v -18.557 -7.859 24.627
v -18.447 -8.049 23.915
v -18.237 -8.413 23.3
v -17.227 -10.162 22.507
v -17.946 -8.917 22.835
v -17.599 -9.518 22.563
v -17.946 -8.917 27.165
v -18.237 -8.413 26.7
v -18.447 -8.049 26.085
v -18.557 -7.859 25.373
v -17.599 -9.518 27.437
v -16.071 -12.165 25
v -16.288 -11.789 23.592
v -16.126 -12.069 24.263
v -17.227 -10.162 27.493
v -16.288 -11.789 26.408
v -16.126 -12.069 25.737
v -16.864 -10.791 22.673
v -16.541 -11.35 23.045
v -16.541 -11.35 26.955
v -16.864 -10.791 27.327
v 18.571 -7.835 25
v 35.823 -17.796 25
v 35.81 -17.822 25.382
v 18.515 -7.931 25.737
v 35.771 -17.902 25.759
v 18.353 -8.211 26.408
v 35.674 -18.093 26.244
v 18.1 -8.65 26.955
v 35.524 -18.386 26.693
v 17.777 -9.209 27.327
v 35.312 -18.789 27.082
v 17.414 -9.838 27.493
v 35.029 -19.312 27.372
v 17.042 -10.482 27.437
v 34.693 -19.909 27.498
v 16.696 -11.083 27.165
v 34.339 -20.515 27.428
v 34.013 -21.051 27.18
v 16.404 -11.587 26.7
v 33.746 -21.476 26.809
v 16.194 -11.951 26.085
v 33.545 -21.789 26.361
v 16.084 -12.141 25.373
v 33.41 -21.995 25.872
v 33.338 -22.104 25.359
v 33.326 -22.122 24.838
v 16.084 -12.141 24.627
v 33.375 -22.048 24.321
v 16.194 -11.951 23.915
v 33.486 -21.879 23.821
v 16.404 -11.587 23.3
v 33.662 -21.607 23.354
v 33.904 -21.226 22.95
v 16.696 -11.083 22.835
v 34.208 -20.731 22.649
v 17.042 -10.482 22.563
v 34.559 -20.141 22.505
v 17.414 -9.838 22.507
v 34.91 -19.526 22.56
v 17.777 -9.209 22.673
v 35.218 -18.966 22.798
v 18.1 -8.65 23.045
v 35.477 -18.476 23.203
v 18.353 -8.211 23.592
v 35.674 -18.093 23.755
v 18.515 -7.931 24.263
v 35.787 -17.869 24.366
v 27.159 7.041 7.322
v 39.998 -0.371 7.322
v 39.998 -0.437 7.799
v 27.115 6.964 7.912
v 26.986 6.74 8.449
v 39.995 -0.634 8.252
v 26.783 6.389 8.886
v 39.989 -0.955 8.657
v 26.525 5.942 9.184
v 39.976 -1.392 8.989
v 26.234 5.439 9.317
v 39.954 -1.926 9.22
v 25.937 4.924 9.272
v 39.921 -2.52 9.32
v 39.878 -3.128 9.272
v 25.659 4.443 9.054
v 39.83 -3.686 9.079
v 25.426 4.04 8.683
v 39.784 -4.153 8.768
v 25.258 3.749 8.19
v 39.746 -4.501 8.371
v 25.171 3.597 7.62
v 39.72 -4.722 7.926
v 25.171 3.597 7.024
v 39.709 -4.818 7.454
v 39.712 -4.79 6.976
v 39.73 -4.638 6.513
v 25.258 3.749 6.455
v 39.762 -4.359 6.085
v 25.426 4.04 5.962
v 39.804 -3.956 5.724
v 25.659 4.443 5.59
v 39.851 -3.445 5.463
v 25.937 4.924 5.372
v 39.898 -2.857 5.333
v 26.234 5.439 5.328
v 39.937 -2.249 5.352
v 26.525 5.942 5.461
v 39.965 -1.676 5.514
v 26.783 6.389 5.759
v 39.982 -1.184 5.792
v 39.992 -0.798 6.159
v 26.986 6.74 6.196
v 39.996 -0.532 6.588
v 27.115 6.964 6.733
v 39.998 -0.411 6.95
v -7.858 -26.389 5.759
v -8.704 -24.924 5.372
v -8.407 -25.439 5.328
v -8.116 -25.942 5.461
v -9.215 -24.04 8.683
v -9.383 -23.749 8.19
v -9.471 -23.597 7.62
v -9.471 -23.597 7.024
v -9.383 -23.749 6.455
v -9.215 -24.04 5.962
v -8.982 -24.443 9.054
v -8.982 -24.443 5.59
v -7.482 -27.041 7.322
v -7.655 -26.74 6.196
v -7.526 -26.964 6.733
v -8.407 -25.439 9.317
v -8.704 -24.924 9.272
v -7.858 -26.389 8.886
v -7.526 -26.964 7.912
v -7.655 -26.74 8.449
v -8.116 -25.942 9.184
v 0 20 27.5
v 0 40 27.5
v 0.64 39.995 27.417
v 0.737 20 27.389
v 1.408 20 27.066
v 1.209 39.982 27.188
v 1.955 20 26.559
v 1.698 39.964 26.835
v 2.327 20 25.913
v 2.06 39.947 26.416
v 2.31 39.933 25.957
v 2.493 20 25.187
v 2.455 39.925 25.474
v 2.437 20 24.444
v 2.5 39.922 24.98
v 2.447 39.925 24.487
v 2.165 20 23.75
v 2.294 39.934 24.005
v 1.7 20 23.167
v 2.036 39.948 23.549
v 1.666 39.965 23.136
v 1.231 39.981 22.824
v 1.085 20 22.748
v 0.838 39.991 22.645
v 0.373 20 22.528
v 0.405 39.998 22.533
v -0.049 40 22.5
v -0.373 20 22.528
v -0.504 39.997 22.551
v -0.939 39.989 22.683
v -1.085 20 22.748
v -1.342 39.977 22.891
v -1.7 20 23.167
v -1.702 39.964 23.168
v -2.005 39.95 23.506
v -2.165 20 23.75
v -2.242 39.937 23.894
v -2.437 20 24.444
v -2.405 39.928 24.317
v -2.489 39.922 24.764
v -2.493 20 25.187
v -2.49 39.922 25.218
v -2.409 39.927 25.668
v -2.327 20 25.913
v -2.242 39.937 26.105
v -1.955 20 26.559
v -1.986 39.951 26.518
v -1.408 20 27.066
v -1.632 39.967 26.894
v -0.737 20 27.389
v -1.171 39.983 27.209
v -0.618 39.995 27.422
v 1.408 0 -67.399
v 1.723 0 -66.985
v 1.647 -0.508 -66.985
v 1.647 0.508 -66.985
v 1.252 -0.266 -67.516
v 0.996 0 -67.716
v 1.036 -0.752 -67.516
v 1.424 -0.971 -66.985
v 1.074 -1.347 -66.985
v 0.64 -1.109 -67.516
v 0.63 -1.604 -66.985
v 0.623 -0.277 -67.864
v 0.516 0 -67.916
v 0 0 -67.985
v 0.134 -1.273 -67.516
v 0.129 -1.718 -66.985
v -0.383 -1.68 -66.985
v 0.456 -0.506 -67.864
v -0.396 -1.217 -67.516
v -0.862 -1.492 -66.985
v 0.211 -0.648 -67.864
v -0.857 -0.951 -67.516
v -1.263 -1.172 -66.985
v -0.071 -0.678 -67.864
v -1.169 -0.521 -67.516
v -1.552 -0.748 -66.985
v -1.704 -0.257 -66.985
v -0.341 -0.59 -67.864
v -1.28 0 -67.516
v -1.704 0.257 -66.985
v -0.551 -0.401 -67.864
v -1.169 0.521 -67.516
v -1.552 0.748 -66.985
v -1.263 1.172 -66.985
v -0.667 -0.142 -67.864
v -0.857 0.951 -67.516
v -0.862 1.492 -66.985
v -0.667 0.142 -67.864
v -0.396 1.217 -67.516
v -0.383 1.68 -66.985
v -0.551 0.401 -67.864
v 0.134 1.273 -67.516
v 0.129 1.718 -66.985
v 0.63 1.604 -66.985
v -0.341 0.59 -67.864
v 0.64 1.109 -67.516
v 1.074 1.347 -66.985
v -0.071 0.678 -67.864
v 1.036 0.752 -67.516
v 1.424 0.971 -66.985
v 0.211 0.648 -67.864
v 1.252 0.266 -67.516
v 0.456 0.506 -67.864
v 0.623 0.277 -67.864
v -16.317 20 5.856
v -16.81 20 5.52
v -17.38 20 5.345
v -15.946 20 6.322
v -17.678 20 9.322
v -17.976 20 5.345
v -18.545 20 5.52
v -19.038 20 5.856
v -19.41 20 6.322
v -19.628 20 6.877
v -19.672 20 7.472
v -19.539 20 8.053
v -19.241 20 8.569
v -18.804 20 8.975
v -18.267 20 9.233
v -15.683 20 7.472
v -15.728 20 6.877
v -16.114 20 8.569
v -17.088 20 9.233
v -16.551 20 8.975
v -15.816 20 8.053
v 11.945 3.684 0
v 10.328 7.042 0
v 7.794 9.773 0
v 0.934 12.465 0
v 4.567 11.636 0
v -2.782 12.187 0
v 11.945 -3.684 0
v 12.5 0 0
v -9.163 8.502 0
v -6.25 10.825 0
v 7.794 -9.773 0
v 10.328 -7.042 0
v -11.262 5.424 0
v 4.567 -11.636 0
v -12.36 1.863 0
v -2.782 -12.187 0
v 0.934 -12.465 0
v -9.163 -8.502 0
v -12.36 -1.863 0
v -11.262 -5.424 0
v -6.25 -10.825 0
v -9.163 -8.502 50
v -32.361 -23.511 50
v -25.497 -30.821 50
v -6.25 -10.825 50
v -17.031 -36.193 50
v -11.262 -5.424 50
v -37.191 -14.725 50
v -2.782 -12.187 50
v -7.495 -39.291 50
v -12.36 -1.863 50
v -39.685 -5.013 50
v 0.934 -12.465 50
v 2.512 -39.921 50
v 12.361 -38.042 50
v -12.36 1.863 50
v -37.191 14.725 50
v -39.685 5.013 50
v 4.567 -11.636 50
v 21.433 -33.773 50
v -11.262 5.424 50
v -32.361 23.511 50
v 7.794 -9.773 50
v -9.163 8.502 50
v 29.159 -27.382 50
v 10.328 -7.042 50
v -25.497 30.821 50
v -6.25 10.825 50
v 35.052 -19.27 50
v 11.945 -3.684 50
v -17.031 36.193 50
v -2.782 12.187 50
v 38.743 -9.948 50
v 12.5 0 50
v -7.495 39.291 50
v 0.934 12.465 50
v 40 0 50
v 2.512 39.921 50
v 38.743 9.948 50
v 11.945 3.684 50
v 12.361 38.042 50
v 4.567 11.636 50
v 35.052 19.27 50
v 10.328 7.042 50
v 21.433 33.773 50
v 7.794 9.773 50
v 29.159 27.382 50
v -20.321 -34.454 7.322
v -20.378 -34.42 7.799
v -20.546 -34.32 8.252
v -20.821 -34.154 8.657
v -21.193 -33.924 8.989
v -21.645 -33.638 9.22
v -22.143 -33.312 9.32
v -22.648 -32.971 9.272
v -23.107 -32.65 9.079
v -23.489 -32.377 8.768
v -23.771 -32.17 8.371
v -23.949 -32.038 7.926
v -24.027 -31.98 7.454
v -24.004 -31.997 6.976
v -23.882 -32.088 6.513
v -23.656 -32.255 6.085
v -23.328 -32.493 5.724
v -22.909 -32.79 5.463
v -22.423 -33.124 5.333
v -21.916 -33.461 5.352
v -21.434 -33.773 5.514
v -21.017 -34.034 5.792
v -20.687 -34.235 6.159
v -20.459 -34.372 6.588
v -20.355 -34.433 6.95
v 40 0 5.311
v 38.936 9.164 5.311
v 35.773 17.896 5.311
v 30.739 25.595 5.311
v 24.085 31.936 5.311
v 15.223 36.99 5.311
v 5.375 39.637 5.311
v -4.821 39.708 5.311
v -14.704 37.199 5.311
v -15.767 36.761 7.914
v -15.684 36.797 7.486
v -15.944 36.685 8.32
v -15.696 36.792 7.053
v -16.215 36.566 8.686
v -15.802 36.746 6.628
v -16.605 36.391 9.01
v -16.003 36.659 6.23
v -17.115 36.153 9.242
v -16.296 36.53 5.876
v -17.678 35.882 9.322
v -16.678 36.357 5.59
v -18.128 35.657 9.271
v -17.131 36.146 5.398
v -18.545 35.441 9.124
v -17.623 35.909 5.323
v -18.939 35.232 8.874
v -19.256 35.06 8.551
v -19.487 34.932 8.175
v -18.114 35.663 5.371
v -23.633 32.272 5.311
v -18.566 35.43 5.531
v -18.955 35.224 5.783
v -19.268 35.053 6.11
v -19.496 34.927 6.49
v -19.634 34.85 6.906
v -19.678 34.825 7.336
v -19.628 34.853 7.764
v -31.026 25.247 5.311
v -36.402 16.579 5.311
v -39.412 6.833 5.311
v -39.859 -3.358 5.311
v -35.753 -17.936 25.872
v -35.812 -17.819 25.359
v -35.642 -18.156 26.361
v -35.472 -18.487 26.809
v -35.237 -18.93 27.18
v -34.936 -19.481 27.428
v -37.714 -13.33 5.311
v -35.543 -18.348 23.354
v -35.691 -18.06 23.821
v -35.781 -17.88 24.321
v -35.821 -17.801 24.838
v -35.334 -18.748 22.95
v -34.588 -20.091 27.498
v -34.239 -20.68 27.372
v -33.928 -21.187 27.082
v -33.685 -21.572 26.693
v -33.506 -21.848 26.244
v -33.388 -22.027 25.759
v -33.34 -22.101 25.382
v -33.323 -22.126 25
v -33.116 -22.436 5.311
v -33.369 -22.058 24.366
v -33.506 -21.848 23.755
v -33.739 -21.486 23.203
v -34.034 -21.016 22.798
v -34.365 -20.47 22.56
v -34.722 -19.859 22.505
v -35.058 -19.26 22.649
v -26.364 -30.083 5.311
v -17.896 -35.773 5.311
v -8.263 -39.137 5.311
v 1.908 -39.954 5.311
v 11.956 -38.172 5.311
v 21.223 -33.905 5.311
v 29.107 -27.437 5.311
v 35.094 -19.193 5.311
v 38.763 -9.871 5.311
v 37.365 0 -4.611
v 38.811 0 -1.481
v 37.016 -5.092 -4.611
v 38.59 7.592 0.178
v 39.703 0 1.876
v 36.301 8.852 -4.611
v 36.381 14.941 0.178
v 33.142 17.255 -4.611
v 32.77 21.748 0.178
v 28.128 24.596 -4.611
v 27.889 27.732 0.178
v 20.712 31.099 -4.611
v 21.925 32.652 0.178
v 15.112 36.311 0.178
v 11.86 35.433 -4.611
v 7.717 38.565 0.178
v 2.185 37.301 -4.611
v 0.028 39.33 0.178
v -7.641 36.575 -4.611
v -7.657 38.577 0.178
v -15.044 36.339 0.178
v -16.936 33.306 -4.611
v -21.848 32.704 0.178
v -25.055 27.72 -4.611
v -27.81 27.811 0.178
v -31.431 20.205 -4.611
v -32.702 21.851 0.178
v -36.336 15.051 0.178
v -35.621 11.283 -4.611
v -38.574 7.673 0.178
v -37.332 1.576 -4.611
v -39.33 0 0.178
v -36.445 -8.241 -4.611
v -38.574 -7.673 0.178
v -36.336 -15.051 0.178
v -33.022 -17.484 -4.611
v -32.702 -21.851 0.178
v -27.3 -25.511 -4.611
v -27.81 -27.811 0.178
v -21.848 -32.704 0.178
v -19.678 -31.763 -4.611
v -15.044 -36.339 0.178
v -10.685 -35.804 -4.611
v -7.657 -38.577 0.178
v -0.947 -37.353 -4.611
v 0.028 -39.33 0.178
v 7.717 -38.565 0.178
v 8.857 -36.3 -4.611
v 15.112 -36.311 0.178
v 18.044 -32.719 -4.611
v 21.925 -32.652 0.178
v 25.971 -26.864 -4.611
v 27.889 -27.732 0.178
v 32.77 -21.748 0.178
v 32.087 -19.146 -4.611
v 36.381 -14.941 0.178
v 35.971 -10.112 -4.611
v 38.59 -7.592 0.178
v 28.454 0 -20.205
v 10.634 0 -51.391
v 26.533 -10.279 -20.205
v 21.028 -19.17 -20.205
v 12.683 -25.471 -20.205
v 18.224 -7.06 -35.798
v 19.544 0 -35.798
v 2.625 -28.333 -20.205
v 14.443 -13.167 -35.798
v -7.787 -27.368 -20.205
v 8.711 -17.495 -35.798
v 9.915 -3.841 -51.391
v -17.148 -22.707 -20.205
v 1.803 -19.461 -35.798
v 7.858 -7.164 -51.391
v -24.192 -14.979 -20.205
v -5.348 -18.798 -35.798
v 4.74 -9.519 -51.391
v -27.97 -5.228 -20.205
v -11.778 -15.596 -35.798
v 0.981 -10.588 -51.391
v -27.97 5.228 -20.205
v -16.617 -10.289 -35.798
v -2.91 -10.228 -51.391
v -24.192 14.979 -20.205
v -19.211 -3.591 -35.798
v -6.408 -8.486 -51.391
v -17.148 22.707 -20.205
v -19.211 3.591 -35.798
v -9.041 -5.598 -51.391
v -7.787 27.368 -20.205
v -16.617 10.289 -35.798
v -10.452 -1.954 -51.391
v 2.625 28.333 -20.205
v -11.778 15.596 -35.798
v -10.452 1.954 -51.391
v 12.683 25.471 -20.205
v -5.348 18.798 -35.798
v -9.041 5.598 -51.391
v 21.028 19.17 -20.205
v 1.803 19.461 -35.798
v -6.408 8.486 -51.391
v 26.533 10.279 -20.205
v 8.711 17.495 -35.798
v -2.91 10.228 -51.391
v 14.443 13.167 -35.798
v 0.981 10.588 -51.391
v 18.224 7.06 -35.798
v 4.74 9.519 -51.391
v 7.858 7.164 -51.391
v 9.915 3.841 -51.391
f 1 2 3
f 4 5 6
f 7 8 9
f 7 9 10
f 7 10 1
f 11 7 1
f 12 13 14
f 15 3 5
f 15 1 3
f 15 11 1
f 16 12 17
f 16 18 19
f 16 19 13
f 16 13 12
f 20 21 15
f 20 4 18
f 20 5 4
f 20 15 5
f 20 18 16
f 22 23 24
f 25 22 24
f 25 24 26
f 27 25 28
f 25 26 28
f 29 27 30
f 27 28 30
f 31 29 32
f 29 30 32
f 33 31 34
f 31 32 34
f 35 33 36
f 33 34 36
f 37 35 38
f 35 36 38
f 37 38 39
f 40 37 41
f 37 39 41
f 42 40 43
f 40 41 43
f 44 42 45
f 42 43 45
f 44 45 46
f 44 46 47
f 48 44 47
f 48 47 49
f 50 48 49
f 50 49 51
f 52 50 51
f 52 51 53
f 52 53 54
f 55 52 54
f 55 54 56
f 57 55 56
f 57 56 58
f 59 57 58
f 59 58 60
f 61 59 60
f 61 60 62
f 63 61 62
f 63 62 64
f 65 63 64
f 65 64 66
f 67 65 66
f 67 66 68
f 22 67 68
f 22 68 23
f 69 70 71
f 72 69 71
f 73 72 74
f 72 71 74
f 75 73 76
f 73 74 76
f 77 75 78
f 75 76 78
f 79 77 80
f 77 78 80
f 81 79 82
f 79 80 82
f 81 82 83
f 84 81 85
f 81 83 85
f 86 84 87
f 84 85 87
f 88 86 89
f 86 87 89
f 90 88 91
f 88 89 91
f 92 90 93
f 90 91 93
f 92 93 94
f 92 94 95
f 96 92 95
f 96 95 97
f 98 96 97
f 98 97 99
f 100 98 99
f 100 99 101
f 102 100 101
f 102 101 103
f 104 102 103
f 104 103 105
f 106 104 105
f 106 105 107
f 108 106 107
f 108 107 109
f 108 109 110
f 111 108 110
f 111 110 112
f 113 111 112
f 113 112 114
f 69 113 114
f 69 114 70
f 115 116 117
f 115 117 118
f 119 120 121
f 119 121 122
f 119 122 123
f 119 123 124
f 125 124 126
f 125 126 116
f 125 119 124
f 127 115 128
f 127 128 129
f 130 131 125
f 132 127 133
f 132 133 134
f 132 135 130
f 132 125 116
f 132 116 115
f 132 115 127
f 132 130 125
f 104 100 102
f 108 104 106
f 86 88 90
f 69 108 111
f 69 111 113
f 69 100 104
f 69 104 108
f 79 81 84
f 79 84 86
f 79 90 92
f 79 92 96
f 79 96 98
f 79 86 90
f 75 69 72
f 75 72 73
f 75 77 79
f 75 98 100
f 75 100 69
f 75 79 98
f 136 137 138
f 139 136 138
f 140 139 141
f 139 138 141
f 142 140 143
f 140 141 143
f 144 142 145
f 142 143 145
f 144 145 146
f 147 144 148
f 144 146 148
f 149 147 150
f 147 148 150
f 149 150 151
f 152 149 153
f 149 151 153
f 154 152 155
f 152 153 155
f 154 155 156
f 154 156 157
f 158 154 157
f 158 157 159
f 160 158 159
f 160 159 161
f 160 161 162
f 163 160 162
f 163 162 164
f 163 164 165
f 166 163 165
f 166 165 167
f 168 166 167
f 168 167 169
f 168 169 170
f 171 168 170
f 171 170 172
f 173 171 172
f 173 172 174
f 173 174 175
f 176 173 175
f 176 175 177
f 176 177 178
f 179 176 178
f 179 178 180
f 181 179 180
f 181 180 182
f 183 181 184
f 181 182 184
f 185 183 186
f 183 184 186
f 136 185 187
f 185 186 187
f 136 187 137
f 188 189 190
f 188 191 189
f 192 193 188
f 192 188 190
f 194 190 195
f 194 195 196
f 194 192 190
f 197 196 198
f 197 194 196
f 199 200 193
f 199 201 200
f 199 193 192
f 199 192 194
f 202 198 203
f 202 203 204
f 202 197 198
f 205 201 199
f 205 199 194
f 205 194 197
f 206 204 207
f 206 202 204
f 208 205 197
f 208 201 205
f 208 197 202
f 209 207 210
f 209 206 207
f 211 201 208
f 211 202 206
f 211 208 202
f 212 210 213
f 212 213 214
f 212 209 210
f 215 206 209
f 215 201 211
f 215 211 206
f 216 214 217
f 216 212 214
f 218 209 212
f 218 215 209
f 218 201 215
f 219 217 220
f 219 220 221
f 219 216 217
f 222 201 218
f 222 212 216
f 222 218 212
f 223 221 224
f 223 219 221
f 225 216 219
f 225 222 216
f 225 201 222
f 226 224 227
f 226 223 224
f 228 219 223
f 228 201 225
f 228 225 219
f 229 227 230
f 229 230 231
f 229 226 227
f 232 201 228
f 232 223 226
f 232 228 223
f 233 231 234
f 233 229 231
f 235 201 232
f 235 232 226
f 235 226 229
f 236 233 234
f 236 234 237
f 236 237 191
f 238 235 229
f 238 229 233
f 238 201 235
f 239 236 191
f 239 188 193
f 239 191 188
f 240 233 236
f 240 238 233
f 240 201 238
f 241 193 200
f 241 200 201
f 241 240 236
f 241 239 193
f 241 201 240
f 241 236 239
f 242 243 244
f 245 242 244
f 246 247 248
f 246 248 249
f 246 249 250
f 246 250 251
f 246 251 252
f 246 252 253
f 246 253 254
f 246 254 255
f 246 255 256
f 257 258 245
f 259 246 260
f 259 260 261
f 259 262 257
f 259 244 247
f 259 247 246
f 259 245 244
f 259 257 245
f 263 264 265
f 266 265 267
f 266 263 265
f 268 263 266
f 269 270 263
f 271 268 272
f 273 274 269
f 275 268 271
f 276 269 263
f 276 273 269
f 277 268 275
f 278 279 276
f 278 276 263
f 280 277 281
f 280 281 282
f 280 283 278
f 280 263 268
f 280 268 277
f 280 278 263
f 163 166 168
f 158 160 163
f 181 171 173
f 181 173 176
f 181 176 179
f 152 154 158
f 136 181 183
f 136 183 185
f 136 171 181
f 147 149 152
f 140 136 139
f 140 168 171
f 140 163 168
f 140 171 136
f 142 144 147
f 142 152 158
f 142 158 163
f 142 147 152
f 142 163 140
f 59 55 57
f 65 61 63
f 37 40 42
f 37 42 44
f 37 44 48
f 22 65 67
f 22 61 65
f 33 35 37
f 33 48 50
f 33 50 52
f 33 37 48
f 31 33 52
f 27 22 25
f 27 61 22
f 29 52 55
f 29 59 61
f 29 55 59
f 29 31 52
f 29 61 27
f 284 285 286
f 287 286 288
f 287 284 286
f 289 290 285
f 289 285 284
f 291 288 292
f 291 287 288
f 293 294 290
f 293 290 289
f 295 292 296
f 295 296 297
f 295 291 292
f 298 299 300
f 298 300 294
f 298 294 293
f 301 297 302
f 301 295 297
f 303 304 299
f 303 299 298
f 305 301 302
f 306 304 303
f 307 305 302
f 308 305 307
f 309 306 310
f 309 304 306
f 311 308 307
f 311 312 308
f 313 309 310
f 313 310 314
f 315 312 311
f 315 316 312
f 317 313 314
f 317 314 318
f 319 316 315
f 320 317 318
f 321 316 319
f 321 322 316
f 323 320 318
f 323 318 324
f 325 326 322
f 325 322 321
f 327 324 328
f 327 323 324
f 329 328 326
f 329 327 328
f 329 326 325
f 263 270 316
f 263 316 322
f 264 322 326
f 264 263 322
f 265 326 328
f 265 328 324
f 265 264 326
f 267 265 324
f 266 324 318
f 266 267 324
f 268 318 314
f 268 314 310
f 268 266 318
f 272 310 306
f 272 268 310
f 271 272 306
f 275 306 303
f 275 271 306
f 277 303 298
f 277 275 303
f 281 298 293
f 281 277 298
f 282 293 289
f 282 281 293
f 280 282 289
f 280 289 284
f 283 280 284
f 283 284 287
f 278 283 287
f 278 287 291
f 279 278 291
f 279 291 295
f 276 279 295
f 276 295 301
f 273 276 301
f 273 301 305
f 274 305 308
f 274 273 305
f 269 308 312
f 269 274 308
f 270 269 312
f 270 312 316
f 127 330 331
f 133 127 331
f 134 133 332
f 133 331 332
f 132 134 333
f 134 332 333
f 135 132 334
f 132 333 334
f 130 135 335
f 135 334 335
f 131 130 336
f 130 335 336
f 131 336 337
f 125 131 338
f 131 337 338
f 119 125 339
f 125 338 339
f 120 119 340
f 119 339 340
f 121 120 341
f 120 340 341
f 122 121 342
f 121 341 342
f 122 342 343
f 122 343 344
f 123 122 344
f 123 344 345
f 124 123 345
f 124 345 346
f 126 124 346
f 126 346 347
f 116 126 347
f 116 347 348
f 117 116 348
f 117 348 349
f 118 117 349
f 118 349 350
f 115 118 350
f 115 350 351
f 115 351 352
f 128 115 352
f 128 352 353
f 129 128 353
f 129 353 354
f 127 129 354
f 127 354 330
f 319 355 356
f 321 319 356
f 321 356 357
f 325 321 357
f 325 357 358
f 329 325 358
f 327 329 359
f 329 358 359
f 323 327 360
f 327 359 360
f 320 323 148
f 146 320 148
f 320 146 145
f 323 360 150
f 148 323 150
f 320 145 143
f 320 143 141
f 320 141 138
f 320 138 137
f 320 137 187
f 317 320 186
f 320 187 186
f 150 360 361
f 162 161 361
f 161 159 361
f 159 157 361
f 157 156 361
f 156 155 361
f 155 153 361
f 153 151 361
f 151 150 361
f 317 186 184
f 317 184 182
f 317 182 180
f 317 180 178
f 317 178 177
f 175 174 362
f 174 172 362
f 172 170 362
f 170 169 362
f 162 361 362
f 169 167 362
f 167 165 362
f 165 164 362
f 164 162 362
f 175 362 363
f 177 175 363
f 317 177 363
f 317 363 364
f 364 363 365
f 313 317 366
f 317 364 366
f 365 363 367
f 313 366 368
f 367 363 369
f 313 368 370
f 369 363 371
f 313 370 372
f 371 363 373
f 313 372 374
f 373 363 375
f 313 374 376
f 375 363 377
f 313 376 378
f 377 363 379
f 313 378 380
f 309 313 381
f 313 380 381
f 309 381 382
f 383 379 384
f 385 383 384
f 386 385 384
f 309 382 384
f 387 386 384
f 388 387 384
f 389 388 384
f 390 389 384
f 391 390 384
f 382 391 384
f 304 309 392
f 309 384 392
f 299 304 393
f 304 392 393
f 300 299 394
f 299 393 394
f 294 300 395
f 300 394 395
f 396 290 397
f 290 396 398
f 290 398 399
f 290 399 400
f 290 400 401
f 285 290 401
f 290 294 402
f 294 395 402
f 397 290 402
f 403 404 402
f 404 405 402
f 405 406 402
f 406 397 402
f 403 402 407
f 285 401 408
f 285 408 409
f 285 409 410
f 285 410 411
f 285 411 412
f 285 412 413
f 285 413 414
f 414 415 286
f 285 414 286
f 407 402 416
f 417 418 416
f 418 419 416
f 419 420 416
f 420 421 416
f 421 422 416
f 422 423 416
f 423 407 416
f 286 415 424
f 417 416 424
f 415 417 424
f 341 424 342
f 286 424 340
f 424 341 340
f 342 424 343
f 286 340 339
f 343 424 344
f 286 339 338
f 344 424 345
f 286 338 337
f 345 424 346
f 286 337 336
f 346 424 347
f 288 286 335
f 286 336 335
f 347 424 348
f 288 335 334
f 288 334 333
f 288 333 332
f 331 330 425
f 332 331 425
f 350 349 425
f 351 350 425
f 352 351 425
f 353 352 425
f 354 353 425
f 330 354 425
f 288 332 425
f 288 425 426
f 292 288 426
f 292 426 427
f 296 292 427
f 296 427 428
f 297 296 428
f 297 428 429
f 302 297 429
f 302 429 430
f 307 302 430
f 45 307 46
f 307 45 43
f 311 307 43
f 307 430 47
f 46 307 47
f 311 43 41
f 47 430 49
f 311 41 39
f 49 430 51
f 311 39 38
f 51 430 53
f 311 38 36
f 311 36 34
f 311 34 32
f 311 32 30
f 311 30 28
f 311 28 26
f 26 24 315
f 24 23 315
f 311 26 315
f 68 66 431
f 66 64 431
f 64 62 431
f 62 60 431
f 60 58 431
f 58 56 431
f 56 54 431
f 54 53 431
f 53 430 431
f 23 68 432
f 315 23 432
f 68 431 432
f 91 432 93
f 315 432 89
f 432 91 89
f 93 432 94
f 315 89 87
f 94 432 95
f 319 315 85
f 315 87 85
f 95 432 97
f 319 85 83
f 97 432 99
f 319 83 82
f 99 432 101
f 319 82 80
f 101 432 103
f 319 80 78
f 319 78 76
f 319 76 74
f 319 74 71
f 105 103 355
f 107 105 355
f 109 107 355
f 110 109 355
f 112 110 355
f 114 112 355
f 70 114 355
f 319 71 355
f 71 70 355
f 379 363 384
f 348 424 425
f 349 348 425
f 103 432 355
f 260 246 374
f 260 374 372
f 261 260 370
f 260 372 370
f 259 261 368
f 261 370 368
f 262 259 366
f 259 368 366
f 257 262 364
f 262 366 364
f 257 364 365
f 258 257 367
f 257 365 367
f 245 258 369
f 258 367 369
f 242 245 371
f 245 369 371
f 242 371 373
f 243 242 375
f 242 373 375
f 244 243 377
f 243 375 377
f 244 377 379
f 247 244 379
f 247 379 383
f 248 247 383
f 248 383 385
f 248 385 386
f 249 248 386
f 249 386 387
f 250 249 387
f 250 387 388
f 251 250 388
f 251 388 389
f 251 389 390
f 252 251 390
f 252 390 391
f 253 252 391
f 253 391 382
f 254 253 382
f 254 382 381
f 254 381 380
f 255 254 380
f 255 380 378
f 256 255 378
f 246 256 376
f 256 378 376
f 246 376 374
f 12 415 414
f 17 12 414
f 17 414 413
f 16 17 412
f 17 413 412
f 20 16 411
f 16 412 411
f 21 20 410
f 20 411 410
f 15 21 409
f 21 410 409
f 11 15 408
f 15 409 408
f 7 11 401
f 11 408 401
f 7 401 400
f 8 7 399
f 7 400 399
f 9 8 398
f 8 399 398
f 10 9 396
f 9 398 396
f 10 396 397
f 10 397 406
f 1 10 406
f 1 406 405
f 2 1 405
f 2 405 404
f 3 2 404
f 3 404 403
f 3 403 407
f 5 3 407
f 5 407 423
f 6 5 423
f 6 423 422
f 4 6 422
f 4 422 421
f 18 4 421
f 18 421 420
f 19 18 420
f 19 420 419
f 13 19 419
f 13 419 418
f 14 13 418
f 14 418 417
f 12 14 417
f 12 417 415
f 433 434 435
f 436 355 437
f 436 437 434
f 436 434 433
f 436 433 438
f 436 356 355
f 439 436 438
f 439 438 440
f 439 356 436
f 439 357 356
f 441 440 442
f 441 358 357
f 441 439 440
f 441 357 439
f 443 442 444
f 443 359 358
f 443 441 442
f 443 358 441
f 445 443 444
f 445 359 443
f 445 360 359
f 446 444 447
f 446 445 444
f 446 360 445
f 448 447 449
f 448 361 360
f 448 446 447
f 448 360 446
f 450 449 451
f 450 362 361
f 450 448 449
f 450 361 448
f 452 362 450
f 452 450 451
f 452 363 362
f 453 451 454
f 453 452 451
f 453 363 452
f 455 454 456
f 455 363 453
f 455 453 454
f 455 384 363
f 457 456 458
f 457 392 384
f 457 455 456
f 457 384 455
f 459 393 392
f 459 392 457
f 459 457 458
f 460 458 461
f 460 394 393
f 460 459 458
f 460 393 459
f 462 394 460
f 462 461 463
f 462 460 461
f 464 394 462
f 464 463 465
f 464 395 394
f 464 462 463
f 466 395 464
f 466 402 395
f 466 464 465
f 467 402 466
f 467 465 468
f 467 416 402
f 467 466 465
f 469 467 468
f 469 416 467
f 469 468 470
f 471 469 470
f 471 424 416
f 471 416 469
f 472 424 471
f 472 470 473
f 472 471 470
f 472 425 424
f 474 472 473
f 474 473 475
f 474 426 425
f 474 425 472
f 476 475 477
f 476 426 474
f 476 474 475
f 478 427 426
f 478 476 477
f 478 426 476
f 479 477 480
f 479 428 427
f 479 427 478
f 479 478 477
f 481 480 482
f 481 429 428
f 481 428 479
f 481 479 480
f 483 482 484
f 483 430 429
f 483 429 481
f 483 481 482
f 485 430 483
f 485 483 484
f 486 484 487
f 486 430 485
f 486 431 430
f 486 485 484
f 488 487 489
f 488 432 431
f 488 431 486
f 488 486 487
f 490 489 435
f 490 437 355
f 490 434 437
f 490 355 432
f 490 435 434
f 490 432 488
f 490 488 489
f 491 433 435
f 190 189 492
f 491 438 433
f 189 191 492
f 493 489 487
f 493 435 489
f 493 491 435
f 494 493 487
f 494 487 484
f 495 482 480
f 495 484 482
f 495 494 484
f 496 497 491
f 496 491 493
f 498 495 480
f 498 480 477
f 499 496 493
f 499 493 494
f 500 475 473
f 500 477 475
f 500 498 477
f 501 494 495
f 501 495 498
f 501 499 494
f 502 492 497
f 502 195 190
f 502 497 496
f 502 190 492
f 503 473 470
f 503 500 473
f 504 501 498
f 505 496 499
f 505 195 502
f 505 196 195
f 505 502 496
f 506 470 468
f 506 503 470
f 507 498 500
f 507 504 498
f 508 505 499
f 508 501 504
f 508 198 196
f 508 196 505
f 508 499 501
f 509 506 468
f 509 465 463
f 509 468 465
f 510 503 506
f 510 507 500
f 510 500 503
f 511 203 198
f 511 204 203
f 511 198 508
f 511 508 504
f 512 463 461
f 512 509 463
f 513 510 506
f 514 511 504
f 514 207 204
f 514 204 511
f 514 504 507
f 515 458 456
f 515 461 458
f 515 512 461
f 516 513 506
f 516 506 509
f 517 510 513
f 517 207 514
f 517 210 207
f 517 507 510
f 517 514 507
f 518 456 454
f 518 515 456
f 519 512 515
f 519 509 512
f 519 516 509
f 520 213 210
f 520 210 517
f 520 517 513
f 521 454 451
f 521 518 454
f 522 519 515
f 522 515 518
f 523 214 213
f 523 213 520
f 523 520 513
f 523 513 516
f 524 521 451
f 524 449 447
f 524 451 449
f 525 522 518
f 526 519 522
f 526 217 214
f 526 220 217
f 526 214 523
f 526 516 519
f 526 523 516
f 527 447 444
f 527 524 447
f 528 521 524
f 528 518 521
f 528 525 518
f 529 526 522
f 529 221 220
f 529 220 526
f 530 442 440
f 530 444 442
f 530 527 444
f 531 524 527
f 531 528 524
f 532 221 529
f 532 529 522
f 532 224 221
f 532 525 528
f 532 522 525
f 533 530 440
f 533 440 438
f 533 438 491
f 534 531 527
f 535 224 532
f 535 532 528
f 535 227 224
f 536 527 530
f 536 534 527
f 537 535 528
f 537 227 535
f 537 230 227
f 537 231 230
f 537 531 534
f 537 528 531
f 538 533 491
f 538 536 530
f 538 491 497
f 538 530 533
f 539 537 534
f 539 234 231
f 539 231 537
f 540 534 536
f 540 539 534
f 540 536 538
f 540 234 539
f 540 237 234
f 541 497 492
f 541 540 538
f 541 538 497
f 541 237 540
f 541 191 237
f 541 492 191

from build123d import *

# Parameters (mm, degrees)
CROQUIS1_R              = 40
CROQUIS1_R_2            = 12.5
SALIENTE_EXTRUIR1_DEPTH = 50
CROQUIS2_R              = 2.5
CORTAR_EXTRUIR1_DEPTH   = 20
CROQUIS3_R              = 2.5
CORTAR_EXTRUIR2_DEPTH   = 20
CROQUIS4_R              = 2.5
CORTAR_EXTRUIR3_DEPTH   = 20
CROQUIS5_R              = 2
CORTAR_EXTRUIR4_DEPTH   = 20
CROQUIS6_R              = 2
CORTAR_EXTRUIR5_DEPTH   = 20
CROQUIS7_R              = 2
CORTAR_EXTRUIR6_DEPTH   = 20
REDONDEO1_R             = 20


with BuildPart() as part:
    # Croquis1 → Saliente-Extruir1 (new body)
    with BuildSketch(Plane.XY):
        Circle(CROQUIS1_R)
        Circle(CROQUIS1_R_2, mode=Mode.SUBTRACT)
    extrude(amount=SALIENTE_EXTRUIR1_DEPTH)

    # Croquis2 → Cortar-Extruir1 (cut)
    with BuildSketch(Plane(origin=(34.641016151, -20, 0), x_dir=(0, 0, -1), z_dir=(0.8660254037844364, -0.5000000000000041, 0))):
        with Locations(Location((-25, 0, 0), (0, 0, 90))):
            Circle(CROQUIS2_R)
    extrude(amount=-CORTAR_EXTRUIR1_DEPTH, mode=Mode.SUBTRACT)

    # Croquis3 → Cortar-Extruir2 (cut)
    with BuildSketch(Plane(origin=(0, 40, 0), x_dir=(1, 0, 0), z_dir=(0, 1, 0))):
        with Locations(Location((0, -25, 0), (0, 0, 270))):
            Circle(CROQUIS3_R)
    extrude(amount=-CORTAR_EXTRUIR2_DEPTH, mode=Mode.SUBTRACT)

    # Croquis4 → Cortar-Extruir3 (cut)
    with BuildSketch(Plane(origin=(-34.641016151, -20, 0), x_dir=(0, 0, -1), z_dir=(-0.8660254037844398, -0.499999999999998, 0))):
        with Locations(Location((-25, 0, 0), (0, 0, 90))):
            Circle(CROQUIS4_R)
    extrude(amount=-CORTAR_EXTRUIR3_DEPTH, mode=Mode.SUBTRACT)

    # Croquis5 → Cortar-Extruir4 (cut)
    with BuildSketch(Plane(origin=(-34.641016151, -20, 0), x_dir=(0, 0, -1), z_dir=(-0.8660254037844398, -0.499999999999998, 0))):
        with Locations(Location((-7.32233047, 17.67766953, 0), (0, 0, 90))):
            Circle(CROQUIS5_R)
    extrude(amount=-CORTAR_EXTRUIR4_DEPTH, mode=Mode.SUBTRACT)

    # Croquis6 → Cortar-Extruir5 (cut)
    with BuildSketch(Plane(origin=(34.641016151, -20, 0), x_dir=(0, 0, -1), z_dir=(0.8660254037844364, -0.5000000000000041, 0))):
        with Locations(Location((-7.32233047, 17.67766953, 0), (0, 0, 90))):
            Circle(CROQUIS6_R)
    extrude(amount=-CORTAR_EXTRUIR5_DEPTH, mode=Mode.SUBTRACT)

    # Croquis7 → Cortar-Extruir6 (cut)
    with BuildSketch(Plane(origin=(0, 40, 0), x_dir=(1, 0, 0), z_dir=(0, 1, 0))):
        with Locations(Location((-17.67766953, -7.32233047, 0), (0, 0, 270))):
            Circle(CROQUIS7_R)
    extrude(amount=-CORTAR_EXTRUIR6_DEPTH, mode=Mode.SUBTRACT)

    # Croquis8 → Revolución1 (revolve)
    with BuildSketch(Plane(origin=(0, 0, 0), x_dir=(1, 0, 0), z_dir=(0, 1, 0))):
        with BuildLine():
            Line((0, 0), (40, 0))
            Line((40, 0), (1.723076923, 66.984615385))
            ThreePointArc((1.723076923, 66.984615385), (0.996101755, 67.716462301), (0, 67.984555753))
            Line((0, 67.984555753), (0, 64.015444247))
            Line((0, 64.015444247), (0, 0))
        make_face()
    revolve(axis=Axis((0, 0, 0), (0, 0, -1)))

    # Redondeo1
    redondeo1_edges = [part.edges().sort_by_distance(p)[0] for p in [
        (-40, 0, 0),
    ]]
    fillet(redondeo1_edges, radius=REDONDEO1_R)


solid = part.part
